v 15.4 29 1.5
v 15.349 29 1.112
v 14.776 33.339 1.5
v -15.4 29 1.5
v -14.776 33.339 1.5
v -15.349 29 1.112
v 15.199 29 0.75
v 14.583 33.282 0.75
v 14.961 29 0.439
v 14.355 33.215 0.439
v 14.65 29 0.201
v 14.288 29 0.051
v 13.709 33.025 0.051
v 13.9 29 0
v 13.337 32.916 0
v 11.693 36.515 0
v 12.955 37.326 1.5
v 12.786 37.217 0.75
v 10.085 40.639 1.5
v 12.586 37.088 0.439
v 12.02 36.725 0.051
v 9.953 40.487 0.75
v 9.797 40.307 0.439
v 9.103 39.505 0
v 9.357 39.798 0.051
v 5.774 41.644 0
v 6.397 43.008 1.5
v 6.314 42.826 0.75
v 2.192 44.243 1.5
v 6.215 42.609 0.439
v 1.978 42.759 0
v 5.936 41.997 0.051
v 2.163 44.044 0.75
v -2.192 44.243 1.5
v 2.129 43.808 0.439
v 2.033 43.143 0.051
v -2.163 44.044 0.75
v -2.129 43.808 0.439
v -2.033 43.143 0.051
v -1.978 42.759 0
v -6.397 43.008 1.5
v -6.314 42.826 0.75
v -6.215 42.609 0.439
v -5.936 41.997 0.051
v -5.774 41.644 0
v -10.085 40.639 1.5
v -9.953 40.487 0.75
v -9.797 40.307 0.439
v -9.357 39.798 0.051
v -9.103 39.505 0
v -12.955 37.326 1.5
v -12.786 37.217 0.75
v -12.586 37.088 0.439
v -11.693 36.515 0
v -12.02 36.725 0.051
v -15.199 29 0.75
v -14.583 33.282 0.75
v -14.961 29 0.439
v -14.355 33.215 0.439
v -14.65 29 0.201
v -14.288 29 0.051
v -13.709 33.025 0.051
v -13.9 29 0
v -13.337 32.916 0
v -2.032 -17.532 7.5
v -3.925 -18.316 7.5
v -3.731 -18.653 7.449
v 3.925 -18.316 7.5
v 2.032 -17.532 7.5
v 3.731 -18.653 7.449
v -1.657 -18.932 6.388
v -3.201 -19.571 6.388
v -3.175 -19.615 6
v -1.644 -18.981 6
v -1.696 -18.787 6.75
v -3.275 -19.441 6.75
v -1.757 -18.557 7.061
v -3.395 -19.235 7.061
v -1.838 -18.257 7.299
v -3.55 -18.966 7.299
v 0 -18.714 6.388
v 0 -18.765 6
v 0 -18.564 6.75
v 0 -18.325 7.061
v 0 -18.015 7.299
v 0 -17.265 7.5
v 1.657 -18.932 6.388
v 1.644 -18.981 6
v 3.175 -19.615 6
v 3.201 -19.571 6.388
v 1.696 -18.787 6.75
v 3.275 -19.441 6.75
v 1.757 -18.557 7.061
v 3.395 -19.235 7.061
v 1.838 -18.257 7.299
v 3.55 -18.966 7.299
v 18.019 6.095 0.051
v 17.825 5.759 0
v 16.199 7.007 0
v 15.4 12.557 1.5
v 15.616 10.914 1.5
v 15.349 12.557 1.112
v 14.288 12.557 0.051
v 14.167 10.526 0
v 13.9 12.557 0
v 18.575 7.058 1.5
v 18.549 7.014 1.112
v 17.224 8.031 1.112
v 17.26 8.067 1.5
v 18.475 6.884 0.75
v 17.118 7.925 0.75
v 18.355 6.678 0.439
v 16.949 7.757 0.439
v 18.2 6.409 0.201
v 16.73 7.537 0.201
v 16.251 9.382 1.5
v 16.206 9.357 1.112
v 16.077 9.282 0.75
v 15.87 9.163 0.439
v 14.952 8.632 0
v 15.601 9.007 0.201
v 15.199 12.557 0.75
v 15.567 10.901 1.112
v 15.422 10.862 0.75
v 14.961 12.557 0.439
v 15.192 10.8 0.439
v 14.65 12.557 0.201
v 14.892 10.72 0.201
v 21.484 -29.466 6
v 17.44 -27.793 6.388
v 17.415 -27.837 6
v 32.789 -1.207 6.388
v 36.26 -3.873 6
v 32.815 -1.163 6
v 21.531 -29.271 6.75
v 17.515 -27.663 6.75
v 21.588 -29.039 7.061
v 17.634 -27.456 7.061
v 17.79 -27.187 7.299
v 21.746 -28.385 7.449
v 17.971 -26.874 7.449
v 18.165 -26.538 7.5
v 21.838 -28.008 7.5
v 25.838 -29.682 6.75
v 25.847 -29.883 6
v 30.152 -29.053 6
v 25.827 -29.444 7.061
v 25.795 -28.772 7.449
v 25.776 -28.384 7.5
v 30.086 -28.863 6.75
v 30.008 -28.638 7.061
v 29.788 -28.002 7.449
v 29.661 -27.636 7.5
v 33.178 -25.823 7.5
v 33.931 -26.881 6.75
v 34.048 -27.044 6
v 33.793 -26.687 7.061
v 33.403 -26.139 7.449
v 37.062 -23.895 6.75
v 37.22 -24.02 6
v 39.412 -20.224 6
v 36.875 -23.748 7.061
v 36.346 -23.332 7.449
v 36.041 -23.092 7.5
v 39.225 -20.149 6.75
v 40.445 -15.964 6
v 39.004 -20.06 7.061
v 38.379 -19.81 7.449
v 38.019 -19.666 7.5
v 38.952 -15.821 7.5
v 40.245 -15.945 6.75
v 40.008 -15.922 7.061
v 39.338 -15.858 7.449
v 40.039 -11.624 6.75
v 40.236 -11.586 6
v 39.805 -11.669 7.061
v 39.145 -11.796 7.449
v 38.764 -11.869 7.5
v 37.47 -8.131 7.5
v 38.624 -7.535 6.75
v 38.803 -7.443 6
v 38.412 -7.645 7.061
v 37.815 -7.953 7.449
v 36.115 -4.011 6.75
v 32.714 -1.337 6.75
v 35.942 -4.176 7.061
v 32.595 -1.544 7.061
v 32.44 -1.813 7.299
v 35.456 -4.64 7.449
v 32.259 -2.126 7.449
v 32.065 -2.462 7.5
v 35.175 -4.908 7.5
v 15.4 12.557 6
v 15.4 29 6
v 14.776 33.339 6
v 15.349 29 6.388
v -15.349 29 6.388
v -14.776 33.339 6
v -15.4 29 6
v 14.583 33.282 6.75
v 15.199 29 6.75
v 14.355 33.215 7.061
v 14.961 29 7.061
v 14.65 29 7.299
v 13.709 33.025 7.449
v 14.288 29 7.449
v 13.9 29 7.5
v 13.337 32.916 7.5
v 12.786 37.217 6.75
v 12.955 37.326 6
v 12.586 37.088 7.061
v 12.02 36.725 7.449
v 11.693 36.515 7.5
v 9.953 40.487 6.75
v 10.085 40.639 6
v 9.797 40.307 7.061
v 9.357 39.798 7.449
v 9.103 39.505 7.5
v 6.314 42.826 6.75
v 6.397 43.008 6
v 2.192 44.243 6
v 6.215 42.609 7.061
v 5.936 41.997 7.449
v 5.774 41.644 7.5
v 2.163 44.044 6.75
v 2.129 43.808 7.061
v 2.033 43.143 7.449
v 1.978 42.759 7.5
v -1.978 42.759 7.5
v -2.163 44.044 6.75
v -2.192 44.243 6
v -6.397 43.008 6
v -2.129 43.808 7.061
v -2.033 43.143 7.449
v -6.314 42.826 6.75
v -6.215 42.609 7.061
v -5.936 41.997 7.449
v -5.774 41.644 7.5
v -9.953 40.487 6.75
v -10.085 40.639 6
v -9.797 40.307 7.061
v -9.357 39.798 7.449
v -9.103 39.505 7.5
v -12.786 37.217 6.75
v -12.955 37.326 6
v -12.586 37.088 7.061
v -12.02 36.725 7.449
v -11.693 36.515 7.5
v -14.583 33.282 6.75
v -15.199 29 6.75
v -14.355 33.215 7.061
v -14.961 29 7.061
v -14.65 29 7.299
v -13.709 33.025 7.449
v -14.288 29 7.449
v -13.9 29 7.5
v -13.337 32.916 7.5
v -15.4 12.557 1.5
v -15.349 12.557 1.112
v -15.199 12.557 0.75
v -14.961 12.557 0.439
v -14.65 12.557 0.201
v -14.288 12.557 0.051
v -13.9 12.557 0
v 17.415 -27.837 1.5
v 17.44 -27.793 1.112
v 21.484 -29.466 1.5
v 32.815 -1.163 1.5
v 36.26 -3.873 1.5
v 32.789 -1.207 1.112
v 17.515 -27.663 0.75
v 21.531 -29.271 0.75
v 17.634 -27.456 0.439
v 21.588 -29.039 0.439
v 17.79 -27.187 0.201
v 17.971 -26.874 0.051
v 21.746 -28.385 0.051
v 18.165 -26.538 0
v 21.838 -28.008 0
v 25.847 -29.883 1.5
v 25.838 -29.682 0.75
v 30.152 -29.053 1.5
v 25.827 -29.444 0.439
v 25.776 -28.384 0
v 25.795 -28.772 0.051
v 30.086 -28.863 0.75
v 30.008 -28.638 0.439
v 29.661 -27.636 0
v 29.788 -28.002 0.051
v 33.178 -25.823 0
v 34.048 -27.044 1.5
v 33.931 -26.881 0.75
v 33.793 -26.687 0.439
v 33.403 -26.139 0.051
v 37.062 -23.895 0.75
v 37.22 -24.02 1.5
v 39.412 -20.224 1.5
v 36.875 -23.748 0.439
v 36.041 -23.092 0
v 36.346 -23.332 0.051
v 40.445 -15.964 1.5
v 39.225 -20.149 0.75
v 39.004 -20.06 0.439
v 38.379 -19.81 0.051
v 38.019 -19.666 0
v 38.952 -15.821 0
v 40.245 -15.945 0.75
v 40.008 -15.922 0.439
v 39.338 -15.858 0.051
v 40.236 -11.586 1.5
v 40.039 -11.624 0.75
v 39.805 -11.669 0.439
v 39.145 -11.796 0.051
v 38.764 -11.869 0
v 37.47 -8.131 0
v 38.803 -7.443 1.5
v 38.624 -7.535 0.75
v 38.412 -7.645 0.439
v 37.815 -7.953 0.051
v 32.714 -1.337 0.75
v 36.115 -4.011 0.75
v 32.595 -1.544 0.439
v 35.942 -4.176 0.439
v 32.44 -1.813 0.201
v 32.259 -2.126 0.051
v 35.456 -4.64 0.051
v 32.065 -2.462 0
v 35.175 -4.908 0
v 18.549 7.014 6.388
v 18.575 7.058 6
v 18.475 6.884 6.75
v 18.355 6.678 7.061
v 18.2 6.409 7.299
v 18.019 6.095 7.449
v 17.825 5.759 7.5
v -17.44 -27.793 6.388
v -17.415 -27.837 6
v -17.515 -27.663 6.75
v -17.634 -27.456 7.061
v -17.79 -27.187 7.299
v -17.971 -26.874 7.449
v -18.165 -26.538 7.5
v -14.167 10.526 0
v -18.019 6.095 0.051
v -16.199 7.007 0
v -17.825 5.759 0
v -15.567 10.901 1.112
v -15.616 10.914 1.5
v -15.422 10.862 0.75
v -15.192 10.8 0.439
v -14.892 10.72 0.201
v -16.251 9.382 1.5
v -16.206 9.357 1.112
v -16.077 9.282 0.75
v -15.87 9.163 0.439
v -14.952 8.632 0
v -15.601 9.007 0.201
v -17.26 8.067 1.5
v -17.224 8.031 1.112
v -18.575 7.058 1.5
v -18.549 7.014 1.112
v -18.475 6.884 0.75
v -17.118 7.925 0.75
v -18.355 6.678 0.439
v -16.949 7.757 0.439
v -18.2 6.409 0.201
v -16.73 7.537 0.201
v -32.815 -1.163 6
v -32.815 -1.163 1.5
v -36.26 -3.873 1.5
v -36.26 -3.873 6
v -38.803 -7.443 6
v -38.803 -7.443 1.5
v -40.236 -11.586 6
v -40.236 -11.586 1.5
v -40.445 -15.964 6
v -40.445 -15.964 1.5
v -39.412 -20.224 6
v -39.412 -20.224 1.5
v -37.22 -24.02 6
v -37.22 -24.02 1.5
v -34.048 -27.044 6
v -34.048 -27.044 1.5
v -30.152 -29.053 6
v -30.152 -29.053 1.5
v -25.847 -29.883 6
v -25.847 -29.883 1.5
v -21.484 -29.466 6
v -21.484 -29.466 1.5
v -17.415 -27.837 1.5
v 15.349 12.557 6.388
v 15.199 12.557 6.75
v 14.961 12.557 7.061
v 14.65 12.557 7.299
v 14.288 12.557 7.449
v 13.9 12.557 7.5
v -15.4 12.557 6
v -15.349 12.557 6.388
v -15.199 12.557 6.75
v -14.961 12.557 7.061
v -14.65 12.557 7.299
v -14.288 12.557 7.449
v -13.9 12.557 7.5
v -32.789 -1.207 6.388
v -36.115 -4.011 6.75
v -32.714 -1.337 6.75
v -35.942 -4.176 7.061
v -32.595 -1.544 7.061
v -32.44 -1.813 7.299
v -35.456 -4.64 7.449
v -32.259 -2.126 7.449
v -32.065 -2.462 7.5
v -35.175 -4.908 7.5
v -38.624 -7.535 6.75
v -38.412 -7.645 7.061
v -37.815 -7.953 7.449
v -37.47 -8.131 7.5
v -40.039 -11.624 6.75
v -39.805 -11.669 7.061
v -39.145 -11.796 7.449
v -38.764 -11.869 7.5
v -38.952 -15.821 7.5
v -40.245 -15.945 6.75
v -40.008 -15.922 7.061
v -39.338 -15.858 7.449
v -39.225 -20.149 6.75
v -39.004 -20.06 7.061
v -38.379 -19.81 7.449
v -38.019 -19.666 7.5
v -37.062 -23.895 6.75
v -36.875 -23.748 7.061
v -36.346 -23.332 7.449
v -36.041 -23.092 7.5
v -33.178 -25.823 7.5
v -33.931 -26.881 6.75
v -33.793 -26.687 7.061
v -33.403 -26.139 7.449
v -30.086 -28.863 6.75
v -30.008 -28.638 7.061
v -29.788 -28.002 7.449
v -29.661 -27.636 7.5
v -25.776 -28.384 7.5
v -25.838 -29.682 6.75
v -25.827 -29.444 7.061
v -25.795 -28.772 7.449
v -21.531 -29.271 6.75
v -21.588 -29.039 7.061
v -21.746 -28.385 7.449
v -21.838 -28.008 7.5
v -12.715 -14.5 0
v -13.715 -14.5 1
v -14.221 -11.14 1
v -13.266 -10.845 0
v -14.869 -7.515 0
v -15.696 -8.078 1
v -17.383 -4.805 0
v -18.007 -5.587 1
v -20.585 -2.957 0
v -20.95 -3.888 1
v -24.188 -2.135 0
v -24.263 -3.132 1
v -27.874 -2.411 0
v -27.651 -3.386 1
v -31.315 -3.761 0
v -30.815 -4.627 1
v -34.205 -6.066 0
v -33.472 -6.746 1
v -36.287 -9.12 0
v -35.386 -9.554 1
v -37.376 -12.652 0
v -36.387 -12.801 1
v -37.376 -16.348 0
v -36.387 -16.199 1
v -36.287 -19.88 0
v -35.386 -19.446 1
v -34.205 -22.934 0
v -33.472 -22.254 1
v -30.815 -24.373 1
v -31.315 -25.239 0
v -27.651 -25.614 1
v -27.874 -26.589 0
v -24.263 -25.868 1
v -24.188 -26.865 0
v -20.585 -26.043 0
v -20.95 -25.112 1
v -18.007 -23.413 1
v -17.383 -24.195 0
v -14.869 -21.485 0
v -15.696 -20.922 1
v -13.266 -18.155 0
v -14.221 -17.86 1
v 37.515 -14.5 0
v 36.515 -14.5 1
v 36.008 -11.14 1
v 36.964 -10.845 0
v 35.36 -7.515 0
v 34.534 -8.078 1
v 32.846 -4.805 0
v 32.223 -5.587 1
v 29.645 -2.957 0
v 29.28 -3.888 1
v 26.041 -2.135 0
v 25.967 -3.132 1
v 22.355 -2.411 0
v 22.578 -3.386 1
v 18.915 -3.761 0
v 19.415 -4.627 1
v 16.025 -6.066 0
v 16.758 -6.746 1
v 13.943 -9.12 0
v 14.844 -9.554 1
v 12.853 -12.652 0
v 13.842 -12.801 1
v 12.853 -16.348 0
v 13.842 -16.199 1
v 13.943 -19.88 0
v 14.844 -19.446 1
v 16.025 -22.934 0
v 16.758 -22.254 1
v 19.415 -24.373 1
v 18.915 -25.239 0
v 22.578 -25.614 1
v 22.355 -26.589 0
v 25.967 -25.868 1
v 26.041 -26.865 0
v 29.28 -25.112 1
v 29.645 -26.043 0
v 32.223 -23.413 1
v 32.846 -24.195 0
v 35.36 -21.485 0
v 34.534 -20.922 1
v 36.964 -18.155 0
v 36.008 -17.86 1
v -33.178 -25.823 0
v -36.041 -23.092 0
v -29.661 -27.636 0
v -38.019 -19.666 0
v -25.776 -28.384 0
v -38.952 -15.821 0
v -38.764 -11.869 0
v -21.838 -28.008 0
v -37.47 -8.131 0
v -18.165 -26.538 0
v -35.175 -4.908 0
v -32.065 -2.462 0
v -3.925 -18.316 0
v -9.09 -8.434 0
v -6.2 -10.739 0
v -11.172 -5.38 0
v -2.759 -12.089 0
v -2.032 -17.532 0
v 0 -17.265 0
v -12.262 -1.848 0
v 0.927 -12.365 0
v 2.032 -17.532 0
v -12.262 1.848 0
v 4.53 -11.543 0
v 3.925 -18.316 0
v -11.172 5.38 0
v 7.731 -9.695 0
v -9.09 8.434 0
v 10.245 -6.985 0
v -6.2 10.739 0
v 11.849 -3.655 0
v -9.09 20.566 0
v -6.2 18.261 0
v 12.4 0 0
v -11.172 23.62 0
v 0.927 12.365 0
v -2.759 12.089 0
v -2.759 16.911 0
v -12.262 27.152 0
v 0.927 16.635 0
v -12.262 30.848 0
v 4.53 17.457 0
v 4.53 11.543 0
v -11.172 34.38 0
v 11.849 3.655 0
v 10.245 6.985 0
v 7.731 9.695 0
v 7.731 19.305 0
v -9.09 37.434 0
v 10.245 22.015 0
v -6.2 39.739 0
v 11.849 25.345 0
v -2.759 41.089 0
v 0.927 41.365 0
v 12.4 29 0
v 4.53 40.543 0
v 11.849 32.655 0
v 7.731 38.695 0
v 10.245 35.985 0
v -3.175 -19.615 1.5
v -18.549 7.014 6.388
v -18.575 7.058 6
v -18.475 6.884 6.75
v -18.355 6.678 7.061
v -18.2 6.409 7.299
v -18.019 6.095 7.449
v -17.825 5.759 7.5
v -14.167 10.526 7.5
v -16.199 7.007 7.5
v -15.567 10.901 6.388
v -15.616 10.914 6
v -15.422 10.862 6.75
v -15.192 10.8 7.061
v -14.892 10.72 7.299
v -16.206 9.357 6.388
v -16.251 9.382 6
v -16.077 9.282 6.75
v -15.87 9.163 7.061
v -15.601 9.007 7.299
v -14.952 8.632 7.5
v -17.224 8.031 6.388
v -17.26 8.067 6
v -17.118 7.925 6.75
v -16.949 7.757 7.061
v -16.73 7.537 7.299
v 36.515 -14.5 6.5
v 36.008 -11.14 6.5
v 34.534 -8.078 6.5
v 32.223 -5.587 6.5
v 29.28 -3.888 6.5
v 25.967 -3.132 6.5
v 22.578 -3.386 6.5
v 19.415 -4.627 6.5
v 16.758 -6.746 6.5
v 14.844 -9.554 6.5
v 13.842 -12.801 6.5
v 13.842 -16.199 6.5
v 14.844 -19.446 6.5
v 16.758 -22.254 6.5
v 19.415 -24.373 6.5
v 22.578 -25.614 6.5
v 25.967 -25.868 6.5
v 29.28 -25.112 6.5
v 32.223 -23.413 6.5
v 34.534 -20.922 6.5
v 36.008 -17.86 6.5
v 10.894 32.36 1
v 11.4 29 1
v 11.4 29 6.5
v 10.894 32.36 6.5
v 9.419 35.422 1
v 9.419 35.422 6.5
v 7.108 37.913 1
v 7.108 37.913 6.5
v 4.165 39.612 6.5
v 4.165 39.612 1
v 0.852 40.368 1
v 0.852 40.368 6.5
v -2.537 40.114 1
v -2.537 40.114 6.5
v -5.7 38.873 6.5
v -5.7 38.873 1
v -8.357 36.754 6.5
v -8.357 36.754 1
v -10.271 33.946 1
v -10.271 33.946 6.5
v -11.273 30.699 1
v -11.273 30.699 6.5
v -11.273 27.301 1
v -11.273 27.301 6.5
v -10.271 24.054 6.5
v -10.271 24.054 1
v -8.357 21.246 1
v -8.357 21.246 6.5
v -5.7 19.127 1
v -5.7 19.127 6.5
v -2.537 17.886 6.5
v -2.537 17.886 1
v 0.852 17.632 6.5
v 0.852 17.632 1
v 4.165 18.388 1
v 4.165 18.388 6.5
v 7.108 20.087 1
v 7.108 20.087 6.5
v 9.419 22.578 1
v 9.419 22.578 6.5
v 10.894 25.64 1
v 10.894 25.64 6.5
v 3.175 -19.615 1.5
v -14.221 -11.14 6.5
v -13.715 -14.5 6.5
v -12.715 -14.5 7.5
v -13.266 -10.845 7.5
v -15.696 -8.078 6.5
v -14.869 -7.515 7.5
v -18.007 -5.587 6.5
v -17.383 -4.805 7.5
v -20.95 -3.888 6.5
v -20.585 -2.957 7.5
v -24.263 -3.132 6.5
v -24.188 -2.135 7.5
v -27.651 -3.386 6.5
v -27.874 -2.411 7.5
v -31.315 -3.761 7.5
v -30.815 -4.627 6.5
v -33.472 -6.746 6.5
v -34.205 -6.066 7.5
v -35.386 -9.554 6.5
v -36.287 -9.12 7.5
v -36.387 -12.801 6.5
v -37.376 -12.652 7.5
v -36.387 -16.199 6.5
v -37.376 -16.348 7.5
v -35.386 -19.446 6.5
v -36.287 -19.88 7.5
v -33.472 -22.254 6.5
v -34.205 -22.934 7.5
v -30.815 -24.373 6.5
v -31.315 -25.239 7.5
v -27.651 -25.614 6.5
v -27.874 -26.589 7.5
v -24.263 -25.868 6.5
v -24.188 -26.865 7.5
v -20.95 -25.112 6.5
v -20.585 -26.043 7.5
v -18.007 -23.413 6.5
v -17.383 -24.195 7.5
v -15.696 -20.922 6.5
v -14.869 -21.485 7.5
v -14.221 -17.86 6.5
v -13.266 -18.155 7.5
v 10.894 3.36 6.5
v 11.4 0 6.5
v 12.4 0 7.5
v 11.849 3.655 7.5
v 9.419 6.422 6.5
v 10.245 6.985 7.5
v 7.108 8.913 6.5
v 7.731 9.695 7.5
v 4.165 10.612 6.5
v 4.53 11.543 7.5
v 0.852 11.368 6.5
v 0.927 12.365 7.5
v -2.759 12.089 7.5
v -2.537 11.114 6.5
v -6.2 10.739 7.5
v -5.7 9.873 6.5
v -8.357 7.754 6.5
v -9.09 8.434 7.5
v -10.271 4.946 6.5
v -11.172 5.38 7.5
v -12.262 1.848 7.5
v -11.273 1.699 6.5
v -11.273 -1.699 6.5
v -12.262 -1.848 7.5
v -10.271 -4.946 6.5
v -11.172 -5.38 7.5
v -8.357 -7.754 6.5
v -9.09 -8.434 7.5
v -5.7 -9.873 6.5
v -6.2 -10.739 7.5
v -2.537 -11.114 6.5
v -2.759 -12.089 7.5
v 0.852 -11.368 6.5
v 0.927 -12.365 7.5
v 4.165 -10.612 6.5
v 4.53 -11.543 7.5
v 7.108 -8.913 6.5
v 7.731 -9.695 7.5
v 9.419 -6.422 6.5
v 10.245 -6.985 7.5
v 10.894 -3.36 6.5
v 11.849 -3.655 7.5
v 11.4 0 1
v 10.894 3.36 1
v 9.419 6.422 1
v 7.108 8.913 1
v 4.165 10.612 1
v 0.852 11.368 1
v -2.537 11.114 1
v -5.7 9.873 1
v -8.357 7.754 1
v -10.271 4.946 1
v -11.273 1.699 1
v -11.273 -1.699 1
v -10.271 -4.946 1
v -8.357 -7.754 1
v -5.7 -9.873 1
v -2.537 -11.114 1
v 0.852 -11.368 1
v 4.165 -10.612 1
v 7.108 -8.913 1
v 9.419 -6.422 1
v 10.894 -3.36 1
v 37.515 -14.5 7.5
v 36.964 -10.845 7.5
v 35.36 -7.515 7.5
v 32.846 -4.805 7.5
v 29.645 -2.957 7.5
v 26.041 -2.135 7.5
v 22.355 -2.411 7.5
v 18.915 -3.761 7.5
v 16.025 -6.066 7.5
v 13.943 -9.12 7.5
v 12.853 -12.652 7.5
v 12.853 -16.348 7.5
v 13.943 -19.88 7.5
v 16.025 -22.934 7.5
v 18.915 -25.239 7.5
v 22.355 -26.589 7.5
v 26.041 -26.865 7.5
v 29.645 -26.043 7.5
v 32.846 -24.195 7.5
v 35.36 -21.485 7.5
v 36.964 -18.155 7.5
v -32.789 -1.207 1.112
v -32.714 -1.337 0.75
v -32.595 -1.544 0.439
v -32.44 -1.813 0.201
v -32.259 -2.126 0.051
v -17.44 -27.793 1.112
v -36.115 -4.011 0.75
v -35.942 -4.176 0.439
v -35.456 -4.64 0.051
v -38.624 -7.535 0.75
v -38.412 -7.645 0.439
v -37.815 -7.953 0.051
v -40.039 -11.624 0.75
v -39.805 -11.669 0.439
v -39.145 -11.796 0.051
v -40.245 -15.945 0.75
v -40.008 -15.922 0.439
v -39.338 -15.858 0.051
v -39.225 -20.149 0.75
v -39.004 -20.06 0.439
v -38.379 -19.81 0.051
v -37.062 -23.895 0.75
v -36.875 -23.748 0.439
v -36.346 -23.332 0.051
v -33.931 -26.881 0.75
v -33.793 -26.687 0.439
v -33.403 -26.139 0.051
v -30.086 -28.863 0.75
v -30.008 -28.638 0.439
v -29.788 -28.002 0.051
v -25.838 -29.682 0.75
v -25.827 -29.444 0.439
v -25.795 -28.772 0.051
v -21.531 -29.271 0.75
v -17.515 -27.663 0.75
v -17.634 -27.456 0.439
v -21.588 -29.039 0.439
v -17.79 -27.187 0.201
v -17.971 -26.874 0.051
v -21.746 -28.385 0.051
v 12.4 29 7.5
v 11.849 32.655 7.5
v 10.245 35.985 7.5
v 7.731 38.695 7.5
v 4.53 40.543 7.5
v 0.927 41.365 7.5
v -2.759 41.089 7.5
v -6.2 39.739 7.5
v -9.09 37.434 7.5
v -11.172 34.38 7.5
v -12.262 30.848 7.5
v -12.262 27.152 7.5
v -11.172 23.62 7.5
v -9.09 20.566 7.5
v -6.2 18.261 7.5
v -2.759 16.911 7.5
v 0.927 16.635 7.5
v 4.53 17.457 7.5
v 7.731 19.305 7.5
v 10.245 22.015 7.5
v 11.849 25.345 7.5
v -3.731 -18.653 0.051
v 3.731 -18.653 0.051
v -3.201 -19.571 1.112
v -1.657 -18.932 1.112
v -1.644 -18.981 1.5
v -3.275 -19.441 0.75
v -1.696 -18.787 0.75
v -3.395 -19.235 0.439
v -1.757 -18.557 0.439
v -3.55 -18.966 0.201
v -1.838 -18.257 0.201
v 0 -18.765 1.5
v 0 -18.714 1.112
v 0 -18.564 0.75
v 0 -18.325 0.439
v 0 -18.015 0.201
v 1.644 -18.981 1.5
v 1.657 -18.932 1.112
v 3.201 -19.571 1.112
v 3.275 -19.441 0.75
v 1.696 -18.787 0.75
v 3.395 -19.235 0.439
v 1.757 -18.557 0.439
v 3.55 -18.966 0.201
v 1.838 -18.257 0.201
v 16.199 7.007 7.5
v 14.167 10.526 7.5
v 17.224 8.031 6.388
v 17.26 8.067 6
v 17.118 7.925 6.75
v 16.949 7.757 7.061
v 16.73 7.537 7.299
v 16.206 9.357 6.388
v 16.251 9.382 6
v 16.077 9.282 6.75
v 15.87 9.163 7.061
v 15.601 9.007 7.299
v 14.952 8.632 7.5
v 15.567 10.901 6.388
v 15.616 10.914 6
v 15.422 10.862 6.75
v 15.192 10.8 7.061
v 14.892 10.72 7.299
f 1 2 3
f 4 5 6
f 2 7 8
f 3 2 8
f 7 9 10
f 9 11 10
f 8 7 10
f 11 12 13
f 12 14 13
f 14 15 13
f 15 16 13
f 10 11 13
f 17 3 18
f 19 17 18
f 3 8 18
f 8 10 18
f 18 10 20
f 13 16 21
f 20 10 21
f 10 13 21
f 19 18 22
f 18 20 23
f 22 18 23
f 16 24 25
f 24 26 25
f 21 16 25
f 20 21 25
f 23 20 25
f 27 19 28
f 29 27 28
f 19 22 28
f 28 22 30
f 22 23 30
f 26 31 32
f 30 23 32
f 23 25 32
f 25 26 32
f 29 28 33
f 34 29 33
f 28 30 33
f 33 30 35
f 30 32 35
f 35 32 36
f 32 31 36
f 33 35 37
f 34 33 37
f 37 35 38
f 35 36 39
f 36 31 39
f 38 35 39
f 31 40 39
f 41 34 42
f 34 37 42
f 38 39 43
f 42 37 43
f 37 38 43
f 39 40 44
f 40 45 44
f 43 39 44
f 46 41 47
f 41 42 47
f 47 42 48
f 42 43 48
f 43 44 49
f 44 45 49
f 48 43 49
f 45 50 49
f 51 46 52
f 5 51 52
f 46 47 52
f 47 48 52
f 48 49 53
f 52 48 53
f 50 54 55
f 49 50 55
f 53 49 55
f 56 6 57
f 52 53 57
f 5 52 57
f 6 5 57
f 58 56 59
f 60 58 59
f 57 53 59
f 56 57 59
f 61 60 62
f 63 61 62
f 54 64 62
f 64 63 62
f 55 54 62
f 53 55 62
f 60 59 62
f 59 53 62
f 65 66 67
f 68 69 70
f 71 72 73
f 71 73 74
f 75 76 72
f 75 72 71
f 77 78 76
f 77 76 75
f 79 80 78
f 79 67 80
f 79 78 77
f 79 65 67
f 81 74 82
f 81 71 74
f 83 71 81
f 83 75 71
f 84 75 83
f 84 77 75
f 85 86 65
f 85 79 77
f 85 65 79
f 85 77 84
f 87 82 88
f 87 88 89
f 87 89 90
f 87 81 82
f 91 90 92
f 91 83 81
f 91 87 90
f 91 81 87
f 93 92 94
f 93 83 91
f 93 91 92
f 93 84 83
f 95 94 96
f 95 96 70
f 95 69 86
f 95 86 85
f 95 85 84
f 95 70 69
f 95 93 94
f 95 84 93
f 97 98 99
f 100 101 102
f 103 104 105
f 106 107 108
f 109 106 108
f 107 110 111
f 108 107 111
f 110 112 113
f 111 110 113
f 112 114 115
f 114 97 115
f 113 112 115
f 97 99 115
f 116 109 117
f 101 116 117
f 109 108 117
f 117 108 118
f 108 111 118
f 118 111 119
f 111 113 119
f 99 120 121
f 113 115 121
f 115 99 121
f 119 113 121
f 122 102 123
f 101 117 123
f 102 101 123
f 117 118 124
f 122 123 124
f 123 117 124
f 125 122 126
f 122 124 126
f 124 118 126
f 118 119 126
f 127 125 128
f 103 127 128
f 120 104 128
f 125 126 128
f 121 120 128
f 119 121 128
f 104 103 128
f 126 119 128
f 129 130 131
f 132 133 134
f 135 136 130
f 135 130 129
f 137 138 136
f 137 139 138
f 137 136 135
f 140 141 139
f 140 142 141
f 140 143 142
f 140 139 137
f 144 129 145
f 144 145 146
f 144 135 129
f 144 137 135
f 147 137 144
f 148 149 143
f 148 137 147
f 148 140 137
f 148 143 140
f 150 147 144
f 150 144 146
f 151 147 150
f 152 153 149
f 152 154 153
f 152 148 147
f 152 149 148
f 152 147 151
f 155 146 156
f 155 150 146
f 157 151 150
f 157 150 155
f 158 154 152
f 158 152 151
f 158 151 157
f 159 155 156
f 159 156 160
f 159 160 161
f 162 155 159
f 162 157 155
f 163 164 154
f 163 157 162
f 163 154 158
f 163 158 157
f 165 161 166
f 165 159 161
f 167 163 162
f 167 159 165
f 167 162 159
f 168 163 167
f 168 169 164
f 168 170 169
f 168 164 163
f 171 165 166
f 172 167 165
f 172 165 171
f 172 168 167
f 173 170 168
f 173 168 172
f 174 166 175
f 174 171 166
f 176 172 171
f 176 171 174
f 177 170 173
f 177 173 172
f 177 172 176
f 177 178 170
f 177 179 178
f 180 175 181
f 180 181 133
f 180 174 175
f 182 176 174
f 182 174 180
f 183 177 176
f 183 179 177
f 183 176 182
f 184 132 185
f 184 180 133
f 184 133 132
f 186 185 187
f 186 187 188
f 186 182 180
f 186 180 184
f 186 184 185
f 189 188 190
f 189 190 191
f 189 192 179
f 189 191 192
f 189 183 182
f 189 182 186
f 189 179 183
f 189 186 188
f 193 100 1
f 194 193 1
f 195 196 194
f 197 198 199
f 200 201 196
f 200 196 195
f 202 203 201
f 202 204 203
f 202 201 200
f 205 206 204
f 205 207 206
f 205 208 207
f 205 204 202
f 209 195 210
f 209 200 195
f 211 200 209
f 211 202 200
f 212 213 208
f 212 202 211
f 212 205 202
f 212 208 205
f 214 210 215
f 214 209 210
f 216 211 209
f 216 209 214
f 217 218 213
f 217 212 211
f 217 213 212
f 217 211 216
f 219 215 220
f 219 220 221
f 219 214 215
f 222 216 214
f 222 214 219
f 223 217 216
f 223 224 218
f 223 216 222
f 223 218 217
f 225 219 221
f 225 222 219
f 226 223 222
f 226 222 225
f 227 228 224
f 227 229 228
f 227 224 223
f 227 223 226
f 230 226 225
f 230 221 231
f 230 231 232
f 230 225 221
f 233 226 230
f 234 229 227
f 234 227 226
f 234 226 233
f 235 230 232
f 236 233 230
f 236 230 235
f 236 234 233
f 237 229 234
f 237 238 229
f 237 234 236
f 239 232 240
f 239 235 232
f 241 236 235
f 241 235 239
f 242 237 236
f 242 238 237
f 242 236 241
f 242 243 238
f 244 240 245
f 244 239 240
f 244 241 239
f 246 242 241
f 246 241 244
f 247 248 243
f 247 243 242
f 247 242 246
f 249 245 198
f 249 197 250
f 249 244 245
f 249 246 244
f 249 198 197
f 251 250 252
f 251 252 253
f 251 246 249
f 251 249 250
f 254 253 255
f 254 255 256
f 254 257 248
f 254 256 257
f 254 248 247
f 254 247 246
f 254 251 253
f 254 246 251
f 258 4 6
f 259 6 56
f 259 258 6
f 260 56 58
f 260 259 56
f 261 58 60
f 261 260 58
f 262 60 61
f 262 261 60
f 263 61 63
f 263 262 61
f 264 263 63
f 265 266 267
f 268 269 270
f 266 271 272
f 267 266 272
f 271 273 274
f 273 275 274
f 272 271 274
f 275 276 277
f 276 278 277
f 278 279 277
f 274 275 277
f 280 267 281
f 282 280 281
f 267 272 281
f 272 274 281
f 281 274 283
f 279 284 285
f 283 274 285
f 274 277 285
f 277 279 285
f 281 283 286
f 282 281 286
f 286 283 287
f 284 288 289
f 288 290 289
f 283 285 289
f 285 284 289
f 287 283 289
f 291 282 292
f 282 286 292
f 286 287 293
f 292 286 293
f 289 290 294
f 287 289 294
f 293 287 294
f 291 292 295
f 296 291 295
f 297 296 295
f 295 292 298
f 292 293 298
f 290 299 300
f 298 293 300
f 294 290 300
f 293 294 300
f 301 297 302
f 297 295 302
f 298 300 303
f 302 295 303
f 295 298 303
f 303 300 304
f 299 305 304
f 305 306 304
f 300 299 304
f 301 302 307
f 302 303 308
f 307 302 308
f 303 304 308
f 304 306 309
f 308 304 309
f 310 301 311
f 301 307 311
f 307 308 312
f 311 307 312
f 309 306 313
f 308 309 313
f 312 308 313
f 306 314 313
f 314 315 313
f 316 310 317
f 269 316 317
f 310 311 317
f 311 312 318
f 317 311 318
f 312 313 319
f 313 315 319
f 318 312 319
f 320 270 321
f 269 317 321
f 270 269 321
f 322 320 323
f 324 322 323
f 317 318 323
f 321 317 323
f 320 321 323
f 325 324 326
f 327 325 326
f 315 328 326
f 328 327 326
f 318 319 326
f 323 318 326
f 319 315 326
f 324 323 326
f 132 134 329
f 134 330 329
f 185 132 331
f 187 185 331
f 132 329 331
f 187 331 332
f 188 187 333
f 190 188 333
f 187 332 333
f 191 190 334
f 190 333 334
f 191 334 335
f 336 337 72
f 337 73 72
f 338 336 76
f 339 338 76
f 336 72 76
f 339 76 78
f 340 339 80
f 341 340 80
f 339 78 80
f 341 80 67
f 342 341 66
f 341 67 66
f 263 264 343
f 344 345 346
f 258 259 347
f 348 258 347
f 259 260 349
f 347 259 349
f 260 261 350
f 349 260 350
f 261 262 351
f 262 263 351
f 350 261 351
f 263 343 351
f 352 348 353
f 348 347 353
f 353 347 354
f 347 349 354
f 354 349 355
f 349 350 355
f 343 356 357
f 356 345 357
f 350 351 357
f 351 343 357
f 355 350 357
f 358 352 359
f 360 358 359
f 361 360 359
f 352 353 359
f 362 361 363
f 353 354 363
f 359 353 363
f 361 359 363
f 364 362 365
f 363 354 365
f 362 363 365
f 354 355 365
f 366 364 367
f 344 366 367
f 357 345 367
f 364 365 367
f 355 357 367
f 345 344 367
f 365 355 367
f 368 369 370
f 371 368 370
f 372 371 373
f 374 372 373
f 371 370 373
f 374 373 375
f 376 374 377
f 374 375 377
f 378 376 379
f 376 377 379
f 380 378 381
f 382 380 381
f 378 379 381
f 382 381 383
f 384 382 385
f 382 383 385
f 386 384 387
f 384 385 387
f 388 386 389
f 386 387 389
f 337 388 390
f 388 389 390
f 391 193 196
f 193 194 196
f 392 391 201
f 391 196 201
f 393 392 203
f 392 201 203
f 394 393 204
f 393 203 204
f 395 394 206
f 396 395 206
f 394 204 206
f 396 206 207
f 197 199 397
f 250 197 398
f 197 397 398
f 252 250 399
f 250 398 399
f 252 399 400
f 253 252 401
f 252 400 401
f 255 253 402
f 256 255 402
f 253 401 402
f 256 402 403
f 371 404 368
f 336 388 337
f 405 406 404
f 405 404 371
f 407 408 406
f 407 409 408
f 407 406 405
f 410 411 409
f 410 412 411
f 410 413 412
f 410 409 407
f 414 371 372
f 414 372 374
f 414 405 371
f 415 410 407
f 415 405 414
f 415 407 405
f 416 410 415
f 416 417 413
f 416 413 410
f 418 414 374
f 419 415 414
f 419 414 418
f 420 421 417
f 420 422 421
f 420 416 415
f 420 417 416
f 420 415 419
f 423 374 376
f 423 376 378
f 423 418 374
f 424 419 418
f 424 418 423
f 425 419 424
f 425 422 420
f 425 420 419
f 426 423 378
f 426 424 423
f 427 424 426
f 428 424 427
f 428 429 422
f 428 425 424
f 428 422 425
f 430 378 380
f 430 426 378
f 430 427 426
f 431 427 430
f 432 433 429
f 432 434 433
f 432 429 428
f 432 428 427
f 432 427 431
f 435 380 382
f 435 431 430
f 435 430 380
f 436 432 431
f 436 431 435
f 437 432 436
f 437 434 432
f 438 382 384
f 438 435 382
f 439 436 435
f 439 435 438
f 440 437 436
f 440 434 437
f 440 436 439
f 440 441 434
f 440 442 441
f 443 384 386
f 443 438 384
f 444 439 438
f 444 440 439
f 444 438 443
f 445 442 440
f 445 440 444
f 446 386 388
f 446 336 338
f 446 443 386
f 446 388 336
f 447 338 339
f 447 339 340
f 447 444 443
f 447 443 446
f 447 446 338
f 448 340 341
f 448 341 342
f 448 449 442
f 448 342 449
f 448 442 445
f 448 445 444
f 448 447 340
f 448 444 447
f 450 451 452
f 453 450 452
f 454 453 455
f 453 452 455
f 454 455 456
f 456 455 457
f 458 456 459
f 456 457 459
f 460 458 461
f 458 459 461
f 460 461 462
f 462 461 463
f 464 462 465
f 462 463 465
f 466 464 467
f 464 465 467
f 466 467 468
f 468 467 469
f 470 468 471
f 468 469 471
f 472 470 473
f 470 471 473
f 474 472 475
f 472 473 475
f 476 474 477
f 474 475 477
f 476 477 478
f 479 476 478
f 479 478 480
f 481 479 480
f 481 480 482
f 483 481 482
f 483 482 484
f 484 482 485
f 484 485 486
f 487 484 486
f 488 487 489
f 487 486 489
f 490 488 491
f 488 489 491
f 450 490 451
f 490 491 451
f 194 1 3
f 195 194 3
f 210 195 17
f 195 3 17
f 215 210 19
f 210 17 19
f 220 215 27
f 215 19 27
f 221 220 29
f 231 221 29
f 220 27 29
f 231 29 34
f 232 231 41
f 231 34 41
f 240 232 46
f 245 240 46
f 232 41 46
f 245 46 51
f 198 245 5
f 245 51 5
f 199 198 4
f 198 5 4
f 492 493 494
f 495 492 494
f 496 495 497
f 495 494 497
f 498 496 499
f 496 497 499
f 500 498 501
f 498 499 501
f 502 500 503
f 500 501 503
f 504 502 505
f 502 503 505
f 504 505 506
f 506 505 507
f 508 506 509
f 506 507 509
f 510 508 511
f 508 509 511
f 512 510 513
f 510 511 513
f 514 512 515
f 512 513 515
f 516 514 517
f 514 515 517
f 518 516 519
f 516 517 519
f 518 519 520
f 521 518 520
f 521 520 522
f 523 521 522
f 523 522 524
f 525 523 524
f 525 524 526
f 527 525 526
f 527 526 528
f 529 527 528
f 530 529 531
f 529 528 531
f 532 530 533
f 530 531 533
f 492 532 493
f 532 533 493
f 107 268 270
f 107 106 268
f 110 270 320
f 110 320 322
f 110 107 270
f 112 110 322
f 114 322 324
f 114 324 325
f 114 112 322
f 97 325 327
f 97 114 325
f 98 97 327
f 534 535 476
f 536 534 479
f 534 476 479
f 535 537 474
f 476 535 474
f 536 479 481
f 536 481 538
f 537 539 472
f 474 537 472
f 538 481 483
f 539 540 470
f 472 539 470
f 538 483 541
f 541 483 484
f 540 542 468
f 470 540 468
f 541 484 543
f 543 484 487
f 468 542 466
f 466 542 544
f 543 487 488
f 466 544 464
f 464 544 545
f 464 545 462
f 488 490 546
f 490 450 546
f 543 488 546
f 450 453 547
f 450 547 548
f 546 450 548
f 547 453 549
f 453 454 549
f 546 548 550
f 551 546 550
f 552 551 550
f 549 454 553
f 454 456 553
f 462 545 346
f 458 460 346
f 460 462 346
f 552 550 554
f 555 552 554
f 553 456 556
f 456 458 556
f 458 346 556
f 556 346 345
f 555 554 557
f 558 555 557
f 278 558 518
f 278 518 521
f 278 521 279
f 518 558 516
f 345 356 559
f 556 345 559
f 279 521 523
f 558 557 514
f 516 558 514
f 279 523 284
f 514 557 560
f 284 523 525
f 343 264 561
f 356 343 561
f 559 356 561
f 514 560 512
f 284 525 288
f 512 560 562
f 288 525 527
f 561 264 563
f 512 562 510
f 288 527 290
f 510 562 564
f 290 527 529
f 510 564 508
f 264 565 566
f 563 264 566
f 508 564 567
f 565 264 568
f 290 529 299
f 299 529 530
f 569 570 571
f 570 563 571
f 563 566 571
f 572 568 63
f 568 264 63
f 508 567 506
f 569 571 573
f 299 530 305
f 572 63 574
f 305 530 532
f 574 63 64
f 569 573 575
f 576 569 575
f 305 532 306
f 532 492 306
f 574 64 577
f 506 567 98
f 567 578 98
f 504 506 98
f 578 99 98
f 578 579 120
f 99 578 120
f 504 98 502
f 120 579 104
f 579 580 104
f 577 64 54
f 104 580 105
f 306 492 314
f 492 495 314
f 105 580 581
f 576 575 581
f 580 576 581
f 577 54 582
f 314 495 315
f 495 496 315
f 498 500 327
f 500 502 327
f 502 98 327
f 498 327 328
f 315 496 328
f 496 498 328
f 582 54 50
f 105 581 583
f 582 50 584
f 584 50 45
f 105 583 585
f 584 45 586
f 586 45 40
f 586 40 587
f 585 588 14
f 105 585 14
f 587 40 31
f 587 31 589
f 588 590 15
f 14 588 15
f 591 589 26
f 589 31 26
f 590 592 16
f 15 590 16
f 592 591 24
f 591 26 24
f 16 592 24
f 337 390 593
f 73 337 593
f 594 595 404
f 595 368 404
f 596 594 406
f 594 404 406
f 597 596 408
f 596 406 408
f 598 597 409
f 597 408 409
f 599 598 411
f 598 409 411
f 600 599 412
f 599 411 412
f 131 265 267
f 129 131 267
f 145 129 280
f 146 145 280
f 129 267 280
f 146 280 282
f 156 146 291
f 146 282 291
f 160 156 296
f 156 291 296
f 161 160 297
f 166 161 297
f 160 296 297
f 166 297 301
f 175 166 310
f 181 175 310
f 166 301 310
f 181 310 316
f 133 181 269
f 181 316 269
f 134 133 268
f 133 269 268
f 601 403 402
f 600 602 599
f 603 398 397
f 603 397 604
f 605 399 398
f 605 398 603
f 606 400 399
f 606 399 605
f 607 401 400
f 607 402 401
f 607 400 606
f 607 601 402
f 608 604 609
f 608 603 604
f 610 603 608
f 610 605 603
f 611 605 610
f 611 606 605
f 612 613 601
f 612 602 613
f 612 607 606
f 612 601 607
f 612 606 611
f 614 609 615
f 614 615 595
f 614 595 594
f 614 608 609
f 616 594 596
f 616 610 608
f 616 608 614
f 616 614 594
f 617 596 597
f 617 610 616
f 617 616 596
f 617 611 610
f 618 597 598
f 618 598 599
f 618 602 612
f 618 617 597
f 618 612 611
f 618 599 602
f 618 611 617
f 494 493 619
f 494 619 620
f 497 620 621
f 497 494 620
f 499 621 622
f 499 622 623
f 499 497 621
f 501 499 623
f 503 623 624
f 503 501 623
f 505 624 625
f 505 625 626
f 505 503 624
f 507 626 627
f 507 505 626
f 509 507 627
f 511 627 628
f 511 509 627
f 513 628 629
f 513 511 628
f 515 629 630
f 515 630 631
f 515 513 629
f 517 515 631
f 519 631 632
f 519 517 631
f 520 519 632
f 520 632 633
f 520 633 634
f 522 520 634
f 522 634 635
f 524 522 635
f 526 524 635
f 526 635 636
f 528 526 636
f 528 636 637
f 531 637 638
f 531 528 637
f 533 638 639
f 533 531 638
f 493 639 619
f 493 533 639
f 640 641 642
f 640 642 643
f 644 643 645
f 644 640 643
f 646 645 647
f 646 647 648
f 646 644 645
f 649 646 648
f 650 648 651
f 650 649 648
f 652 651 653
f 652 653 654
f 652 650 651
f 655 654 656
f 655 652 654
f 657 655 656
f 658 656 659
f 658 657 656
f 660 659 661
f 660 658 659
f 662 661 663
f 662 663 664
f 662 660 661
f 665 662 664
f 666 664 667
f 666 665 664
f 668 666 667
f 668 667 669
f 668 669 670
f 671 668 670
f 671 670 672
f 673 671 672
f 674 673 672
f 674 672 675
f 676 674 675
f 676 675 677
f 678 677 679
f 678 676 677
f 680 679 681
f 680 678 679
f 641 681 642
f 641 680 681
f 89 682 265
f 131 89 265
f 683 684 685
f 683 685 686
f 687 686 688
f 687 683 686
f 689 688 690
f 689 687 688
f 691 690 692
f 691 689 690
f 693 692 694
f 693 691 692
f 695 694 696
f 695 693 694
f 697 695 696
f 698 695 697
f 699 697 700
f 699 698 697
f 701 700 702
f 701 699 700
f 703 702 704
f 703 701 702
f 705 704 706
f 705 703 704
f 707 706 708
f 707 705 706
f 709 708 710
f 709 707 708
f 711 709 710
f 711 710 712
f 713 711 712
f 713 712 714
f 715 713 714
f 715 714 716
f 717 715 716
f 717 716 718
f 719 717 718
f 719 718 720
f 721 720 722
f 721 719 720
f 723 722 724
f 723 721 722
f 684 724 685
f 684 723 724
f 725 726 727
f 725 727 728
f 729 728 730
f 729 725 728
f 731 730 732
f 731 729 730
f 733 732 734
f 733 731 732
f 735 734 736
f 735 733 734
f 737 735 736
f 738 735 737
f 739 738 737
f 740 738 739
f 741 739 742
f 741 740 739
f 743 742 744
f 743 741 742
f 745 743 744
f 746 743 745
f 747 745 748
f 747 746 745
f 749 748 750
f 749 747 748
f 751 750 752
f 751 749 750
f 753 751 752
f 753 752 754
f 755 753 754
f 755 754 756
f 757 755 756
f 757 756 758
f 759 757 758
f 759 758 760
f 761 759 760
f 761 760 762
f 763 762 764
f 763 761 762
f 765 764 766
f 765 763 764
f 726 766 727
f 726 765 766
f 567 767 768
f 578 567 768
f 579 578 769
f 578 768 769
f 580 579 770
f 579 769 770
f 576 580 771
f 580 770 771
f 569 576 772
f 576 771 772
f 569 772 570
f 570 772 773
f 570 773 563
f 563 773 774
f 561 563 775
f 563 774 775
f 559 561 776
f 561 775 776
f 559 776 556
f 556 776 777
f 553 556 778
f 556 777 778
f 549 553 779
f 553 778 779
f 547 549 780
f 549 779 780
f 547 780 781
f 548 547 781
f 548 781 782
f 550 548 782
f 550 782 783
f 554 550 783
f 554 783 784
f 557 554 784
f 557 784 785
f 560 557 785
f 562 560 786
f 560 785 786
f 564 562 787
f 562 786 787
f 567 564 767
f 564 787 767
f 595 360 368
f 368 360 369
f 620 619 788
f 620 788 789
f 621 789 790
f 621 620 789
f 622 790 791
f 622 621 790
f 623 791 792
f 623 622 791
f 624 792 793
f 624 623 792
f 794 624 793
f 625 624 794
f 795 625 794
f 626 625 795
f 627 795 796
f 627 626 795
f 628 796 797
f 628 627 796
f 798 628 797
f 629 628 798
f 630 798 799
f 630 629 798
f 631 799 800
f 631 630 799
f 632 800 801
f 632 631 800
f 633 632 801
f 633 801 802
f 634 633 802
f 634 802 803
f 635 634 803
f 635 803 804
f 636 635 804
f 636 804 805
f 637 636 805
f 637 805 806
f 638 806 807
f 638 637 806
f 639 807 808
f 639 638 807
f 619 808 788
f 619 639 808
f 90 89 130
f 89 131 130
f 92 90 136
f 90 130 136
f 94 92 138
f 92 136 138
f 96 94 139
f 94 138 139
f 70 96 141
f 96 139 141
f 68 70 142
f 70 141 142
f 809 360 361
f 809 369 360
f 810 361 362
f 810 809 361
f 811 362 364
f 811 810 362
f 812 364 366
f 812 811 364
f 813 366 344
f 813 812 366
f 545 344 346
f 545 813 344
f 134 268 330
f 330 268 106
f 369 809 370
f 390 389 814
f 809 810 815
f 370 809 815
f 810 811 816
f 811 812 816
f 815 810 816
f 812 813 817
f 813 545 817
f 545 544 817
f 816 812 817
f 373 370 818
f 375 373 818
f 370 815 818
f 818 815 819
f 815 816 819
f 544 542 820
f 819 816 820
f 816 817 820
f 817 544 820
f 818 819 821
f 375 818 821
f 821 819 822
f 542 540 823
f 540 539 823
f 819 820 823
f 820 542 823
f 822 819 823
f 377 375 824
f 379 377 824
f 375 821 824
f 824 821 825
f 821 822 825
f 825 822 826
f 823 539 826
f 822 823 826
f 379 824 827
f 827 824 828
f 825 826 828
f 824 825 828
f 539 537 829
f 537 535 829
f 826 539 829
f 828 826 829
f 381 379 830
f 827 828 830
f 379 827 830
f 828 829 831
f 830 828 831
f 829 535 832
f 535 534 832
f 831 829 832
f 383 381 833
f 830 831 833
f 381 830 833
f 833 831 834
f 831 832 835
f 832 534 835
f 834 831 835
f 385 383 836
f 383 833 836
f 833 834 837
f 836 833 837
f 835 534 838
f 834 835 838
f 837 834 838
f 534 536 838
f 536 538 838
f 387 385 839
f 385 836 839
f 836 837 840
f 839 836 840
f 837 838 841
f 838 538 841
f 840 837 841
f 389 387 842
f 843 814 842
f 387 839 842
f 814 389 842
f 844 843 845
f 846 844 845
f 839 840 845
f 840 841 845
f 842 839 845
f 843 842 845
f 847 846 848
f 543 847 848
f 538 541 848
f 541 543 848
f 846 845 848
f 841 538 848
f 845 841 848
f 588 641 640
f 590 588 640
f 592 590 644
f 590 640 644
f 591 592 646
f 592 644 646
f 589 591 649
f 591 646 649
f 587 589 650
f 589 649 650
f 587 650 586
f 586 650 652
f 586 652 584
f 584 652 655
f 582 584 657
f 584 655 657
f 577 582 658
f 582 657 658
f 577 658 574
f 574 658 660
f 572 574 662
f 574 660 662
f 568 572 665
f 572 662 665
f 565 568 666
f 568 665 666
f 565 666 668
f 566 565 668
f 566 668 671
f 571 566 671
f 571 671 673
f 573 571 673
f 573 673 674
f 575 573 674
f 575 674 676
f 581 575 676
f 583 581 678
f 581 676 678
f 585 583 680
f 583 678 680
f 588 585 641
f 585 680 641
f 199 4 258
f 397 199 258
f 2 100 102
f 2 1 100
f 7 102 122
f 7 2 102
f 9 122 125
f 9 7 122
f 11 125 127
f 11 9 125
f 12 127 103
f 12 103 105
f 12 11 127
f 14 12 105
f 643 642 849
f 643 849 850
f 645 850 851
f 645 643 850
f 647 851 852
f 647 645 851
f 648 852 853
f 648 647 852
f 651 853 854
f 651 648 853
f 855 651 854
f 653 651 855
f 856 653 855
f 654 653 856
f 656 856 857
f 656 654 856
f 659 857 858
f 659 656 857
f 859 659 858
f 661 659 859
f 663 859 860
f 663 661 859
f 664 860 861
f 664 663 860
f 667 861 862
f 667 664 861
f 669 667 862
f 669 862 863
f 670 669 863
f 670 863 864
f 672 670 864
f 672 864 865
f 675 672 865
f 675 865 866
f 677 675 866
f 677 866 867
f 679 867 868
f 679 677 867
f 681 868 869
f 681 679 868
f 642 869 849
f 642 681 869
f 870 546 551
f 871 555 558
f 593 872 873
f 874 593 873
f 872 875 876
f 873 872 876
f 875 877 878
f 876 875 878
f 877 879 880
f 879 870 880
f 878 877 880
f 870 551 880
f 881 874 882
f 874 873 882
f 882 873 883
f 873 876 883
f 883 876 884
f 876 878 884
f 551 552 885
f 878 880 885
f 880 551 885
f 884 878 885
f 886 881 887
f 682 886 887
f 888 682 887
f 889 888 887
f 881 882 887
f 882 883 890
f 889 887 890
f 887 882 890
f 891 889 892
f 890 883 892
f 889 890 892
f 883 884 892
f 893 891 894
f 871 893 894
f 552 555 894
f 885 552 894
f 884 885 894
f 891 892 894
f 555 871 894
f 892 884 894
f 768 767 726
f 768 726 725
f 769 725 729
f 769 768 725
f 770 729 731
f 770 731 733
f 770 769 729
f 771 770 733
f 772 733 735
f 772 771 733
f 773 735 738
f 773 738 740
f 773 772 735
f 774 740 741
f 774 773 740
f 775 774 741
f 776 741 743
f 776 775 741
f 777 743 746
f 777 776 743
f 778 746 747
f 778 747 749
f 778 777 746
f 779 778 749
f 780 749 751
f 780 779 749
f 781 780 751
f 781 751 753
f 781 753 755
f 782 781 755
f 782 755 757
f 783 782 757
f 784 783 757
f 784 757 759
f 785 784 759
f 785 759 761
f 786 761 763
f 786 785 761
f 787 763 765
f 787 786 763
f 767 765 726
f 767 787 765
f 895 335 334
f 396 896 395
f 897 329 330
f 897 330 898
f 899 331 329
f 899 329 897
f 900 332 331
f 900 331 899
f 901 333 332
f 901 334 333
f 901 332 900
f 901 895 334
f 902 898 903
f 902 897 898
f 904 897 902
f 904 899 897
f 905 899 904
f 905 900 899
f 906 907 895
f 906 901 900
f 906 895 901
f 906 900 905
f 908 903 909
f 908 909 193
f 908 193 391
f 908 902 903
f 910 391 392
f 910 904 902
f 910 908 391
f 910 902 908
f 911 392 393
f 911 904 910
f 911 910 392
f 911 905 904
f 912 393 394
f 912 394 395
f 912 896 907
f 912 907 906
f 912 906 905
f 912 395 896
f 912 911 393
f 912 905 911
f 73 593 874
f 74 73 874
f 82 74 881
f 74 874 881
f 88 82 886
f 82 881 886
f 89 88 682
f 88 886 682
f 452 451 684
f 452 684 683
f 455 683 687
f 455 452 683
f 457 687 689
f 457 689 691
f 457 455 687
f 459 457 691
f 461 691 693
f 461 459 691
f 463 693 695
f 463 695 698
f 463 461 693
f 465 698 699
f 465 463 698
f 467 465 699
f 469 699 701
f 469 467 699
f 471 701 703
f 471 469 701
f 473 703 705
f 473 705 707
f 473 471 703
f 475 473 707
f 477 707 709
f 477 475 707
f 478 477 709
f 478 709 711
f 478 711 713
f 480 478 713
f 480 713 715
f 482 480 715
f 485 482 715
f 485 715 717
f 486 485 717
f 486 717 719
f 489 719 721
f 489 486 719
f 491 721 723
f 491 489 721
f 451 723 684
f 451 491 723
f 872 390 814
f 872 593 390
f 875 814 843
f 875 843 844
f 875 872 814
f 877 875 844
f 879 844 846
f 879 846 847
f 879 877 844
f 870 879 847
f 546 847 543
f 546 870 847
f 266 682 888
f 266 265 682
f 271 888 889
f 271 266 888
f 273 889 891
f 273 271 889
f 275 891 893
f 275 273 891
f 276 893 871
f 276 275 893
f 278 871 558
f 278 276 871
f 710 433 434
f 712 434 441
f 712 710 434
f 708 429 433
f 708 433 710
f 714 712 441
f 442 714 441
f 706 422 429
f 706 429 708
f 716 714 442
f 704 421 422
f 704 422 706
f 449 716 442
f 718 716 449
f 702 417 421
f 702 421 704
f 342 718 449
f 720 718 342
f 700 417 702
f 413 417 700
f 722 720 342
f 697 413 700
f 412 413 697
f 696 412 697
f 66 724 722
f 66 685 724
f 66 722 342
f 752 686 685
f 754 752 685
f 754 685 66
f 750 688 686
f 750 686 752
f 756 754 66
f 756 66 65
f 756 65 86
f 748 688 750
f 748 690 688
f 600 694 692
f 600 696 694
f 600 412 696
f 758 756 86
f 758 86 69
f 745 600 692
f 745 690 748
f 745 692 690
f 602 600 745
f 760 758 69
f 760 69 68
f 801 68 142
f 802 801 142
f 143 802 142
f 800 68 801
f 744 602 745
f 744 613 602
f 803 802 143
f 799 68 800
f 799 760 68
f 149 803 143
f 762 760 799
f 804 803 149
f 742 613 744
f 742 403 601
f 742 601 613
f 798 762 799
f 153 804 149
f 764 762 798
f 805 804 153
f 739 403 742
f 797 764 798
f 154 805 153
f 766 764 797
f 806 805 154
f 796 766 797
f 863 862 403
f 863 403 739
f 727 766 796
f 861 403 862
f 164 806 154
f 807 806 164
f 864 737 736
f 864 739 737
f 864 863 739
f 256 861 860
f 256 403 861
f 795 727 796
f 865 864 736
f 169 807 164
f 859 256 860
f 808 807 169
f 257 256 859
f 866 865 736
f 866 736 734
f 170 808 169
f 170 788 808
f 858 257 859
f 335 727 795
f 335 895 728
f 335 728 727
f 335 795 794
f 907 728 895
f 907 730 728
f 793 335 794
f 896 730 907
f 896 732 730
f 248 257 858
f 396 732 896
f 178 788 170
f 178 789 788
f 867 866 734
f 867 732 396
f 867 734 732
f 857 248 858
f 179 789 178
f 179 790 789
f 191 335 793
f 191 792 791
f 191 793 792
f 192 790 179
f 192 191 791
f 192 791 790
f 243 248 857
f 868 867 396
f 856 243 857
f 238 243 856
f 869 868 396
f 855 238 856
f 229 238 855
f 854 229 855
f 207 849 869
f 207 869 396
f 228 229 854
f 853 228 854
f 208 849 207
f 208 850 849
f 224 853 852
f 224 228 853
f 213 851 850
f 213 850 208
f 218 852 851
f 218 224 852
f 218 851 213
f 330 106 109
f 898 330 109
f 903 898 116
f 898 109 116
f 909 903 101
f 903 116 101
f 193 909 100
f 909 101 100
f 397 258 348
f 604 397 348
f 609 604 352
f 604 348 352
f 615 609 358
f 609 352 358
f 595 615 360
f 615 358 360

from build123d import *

# Parameters (mm, degrees)
F0_R     = 11.4
F1_DEPTH = 7.5
F2_R     = 1.5
F3_SIZE  = 1


with BuildPart() as f1:
    # F0 (on Top) → F1 (new body)
    with BuildSketch(Plane.XY):
        with BuildLine():
            Line((15.4, 12.557368), (15.4, 29))
            ThreePointArc((15.4, 29), (0, 44.4), (-15.4, 29))
            Line((-15.4, 29), (-15.4, 12.557368))
            ThreePointArc((-15.4, 12.557368), (-16.250739, 9.382368), (-18.575, 7.058107))
            Line((-18.575, 7.058107), (-32.814737, -1.163209))
            ThreePointArc((-32.814737, -1.163209), (-38.451528, -22.2), (-17.414737, -27.836791))
            Line((-17.414737, -27.836791), (-3.175, -19.615475))
            ThreePointArc((-3.175, -19.615475), (0, -18.764737), (3.175, -19.615475))
            Line((3.175, -19.615475), (17.414737, -27.836791))
            ThreePointArc((17.414737, -27.836791), (38.451528, -22.2), (32.814737, -1.163209))
            Line((32.814737, -1.163209), (18.575, 7.058107))
            ThreePointArc((18.575, 7.058107), (16.250739, 9.382368), (15.4, 12.557368))
        make_face()
        with Locations((-25.114737, -14.5)):
            Circle(F0_R, mode=Mode.SUBTRACT)
        with Locations((25.114737, -14.5)):
            Circle(F0_R, mode=Mode.SUBTRACT)
        Circle(F0_R, mode=Mode.SUBTRACT)
        with Locations((0, 29)):
            Circle(F0_R, mode=Mode.SUBTRACT)
    extrude(amount=F1_DEPTH)

    # F2
    f2_edges = [f1.edges().sort_by_distance(p)[0] for p in [
        (-16.250739, 9.382368, 0),
        (15.4, 12.557368, 3.75),
        (25.694868, 2.947449, 7.5),
    ]]
    fillet(f2_edges, radius=F2_R)

    # F3
    f3_edges = [f1.edges().sort_by_distance(p)[0] for p in [
        (-11.4, 29, 7.5),
        (-11.4, 0, 0),
        (-11.4, 0, 7.5),
        (13.714737, -14.5, 0),
        (13.714737, -14.5, 7.5),
        (-36.514737, -14.5, 7.5),
        (-36.514737, -14.5, 0),
        (-11.4, 29, 0),
    ]]
    chamfer(f3_edges, length=F3_SIZE)


solid = f1.part
